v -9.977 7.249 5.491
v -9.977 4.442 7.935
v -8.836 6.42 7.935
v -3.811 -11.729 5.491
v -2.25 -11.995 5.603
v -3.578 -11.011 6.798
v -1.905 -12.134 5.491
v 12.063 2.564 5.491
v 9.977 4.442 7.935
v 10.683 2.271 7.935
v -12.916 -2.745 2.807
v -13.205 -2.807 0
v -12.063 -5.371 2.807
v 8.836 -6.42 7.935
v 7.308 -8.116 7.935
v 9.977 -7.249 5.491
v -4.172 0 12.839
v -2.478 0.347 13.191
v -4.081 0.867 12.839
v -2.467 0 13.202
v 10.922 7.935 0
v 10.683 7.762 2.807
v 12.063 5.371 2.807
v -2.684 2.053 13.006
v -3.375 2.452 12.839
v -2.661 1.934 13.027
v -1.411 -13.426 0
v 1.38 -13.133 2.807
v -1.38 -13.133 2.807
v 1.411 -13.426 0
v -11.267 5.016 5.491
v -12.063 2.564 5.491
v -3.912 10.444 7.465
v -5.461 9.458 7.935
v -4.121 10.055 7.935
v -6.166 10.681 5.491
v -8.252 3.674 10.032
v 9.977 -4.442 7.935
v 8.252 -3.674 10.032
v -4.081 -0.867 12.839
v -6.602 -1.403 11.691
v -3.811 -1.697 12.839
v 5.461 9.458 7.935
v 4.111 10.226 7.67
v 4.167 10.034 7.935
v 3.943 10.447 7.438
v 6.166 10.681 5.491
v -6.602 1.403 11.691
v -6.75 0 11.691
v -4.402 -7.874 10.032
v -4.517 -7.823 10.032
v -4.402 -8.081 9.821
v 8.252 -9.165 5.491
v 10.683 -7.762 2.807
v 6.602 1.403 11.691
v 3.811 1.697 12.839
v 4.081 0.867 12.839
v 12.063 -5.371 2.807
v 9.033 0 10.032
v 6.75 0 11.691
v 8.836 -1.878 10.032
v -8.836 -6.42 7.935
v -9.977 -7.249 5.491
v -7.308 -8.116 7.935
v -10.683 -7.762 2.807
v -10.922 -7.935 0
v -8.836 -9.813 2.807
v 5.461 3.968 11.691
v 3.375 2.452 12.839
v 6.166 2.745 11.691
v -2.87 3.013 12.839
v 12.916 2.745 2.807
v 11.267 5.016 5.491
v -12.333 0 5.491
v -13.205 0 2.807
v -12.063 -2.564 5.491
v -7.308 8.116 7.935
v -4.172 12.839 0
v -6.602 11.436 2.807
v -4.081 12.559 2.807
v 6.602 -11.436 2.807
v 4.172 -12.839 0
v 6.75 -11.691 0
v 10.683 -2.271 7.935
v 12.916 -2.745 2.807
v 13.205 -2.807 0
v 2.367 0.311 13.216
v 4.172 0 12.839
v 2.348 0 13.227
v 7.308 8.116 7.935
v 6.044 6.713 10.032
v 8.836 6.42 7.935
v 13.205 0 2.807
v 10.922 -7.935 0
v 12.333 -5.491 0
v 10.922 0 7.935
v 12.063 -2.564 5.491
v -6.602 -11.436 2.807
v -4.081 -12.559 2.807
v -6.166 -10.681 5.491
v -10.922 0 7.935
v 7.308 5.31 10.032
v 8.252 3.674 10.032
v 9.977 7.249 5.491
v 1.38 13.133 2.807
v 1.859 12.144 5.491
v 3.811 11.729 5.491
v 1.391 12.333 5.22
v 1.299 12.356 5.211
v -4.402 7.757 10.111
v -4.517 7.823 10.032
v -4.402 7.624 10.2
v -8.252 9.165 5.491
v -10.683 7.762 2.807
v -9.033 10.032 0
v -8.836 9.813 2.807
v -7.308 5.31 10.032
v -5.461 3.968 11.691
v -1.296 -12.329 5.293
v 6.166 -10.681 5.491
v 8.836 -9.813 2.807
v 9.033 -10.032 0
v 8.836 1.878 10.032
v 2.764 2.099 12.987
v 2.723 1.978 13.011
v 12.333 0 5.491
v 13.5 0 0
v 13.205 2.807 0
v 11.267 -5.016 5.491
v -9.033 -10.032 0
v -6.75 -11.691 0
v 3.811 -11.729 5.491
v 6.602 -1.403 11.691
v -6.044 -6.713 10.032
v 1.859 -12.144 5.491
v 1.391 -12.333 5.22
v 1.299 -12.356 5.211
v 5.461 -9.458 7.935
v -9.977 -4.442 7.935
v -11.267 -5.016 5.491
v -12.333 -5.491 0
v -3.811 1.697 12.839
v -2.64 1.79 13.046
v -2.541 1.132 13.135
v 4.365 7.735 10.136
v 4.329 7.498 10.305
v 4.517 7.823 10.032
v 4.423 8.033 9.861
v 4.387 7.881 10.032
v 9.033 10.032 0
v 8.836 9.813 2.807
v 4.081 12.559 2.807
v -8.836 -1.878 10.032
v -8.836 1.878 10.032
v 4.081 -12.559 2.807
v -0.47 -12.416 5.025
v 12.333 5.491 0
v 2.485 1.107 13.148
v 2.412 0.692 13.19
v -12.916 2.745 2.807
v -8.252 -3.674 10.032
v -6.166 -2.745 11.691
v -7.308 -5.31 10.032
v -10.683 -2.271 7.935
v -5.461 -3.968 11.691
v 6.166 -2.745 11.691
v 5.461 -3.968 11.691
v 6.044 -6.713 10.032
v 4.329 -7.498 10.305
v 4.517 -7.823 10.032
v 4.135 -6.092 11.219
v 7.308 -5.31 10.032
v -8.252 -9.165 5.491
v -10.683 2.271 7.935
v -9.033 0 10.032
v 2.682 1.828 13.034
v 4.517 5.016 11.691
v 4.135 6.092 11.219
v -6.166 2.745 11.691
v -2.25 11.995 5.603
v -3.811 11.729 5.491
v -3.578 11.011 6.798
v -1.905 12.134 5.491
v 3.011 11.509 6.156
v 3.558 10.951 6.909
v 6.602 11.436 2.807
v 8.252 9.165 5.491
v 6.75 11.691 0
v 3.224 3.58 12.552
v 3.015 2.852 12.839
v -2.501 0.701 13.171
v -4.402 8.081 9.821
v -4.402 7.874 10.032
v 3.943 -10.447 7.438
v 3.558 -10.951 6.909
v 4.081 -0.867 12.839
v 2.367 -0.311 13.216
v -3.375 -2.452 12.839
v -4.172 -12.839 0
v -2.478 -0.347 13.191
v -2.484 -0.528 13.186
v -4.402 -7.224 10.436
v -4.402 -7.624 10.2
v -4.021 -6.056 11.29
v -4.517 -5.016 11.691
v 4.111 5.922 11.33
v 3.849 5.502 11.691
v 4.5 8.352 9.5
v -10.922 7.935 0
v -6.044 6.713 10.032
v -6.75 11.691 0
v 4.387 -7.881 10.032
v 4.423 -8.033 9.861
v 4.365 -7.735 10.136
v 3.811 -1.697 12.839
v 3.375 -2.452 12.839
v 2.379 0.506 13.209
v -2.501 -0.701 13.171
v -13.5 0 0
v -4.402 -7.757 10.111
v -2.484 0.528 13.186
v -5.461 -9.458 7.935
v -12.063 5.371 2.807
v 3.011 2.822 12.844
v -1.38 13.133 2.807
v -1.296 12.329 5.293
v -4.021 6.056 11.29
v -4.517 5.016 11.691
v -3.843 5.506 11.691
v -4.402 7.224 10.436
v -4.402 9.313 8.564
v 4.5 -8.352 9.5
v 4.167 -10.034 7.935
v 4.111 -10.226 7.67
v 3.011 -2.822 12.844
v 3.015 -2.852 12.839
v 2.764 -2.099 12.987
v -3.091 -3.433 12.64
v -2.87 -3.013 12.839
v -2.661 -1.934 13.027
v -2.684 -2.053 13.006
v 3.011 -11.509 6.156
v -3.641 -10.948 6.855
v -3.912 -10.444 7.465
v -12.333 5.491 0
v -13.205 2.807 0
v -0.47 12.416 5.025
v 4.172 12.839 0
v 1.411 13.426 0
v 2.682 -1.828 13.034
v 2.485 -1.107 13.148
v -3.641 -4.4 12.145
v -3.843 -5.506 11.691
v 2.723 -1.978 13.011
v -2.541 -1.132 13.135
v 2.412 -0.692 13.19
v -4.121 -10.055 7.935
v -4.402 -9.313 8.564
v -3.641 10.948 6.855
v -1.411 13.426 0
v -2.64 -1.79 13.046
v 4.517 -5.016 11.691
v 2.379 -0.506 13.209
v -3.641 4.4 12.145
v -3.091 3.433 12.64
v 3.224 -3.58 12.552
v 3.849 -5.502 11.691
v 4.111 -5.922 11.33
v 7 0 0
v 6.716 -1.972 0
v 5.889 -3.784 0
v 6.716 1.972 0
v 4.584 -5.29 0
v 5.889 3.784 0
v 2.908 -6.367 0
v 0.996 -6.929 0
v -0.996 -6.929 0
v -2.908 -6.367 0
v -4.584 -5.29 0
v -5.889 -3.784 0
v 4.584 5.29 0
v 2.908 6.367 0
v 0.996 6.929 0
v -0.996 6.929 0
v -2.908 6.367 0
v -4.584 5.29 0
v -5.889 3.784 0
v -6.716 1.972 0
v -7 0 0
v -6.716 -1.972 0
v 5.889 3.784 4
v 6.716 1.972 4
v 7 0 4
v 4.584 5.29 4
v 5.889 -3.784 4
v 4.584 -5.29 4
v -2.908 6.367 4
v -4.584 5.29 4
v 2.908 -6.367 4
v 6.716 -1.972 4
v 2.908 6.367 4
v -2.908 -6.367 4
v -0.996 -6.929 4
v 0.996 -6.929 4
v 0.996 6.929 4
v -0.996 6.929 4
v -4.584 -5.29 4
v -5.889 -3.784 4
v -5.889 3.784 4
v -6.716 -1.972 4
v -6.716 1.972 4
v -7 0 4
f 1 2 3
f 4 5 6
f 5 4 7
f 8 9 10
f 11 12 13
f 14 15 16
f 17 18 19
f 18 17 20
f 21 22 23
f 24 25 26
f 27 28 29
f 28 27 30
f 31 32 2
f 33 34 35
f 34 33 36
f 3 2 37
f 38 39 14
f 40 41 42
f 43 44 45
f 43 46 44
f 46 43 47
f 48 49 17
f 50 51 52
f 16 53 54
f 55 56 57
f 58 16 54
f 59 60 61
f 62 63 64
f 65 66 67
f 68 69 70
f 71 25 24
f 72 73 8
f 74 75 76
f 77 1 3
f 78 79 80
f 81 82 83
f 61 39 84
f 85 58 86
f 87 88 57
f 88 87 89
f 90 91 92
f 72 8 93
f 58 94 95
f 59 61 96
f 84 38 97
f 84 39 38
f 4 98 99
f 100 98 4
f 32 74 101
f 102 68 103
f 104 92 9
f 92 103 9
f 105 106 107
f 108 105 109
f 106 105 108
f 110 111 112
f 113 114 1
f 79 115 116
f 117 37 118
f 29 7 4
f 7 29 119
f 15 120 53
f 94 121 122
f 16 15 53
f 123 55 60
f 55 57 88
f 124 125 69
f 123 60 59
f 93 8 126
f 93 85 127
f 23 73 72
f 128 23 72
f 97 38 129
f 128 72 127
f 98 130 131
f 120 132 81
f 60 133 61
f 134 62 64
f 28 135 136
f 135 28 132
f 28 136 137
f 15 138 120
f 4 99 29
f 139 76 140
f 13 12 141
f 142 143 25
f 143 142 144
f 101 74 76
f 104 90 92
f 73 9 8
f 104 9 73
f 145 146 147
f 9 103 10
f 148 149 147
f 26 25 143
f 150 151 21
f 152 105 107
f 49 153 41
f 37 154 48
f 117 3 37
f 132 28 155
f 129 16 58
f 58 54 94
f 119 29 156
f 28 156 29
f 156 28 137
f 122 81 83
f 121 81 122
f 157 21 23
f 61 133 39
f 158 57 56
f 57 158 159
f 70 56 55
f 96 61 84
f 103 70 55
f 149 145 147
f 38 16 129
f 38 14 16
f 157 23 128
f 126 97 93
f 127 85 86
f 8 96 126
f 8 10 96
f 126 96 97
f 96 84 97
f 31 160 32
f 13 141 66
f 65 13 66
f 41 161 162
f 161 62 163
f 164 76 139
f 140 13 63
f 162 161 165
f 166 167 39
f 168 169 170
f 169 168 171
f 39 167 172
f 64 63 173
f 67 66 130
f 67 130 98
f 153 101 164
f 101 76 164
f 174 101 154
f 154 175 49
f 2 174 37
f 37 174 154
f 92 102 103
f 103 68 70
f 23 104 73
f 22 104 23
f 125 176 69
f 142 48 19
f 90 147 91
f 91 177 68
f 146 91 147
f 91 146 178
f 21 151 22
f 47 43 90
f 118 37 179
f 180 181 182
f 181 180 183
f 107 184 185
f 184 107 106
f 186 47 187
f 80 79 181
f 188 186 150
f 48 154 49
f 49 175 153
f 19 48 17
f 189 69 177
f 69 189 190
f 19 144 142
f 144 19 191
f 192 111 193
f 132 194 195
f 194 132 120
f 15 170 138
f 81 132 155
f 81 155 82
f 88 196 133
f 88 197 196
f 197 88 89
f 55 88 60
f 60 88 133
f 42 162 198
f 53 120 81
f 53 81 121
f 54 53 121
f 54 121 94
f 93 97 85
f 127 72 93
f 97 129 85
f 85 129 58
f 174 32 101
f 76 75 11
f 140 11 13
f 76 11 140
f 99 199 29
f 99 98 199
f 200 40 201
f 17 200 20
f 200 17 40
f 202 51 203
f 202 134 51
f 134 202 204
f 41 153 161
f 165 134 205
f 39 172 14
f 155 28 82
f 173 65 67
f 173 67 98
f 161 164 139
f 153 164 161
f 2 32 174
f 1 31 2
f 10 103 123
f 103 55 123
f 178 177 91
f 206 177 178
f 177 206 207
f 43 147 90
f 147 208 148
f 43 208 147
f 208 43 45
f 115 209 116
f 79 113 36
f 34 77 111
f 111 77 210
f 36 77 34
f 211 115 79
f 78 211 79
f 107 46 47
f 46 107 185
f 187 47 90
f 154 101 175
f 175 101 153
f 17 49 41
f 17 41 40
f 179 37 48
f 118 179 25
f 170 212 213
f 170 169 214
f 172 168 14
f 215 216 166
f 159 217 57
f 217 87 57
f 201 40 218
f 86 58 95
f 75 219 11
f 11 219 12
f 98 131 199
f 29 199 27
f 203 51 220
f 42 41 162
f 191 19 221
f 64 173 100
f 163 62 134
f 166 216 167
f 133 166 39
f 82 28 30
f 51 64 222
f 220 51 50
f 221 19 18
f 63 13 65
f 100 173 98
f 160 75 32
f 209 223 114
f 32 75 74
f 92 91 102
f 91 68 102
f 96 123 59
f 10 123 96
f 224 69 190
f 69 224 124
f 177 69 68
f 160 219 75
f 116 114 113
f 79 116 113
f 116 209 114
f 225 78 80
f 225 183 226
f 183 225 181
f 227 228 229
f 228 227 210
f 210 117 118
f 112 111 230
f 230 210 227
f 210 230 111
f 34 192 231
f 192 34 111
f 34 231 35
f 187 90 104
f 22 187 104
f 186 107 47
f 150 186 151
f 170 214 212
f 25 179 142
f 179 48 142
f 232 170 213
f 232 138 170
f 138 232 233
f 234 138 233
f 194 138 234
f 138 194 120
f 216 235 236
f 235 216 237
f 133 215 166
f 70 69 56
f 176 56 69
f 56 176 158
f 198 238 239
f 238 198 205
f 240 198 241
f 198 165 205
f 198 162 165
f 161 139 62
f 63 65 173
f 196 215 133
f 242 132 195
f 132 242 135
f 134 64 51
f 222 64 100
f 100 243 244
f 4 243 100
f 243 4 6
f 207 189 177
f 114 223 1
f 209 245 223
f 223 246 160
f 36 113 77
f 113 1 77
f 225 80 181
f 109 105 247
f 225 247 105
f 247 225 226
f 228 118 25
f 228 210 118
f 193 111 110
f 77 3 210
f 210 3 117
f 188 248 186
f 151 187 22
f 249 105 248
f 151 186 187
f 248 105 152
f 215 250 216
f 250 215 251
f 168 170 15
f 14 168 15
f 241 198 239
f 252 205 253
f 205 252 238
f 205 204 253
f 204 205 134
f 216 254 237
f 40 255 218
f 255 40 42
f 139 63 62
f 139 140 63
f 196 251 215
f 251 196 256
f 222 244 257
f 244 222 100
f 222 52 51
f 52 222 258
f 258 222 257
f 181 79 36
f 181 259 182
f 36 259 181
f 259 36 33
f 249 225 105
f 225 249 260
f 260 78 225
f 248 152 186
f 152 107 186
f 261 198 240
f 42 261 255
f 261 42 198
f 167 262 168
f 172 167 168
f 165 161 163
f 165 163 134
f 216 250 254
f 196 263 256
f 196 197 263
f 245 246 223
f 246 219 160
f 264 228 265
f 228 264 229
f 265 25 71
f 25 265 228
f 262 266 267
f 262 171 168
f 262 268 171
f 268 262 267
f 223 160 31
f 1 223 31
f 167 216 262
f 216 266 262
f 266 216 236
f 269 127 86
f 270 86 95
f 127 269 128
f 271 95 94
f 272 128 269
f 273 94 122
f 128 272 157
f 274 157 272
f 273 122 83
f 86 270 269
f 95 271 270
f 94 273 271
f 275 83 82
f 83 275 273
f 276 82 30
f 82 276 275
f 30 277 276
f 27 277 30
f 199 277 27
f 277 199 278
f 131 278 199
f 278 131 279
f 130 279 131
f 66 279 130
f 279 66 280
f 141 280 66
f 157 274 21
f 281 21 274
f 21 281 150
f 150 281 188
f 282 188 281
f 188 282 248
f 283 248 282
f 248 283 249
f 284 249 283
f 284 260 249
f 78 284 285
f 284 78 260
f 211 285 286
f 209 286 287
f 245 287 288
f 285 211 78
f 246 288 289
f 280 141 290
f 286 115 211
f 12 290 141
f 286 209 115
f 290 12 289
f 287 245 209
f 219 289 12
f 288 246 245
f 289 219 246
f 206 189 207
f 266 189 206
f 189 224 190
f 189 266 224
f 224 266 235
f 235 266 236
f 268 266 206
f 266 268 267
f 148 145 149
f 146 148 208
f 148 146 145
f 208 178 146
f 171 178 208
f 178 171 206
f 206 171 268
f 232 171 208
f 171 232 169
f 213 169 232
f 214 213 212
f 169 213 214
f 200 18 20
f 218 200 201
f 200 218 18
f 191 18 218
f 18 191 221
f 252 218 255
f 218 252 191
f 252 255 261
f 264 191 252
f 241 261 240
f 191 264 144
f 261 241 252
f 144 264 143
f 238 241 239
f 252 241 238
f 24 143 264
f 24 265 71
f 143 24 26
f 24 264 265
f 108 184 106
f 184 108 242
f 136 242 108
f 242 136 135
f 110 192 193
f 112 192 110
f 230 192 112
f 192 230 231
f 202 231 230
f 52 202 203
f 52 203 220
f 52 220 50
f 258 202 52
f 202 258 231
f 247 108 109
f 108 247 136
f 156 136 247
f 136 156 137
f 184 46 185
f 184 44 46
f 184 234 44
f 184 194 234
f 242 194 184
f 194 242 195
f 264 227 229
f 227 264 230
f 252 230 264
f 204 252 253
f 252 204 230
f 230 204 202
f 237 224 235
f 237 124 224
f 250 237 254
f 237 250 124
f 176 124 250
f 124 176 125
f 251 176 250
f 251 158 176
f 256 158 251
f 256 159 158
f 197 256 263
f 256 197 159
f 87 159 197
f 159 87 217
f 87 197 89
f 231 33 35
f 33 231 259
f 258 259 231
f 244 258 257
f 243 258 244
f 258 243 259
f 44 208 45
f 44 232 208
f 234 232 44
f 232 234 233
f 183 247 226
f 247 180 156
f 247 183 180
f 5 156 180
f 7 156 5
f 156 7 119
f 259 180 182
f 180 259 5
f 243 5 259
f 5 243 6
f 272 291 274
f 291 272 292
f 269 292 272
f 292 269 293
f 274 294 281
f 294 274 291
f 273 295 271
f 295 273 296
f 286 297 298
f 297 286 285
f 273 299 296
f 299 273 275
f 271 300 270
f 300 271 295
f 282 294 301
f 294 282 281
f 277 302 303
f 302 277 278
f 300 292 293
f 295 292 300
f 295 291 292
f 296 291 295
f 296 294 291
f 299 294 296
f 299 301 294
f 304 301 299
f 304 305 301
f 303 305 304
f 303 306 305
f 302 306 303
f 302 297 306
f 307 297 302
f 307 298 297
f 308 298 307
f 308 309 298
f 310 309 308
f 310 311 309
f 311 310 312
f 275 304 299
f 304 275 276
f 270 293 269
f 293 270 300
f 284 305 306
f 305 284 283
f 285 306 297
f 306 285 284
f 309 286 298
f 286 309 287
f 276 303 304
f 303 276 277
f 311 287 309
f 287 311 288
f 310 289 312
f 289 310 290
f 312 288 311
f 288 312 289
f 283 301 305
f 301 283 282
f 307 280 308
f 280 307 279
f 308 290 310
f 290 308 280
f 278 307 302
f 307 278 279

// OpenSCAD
//Customizable_holder.scad v0.5
//by Benjamen Johnson

// GNU General Public License, version 2
// http://www.gnu.org/licenses/gpl-2.0.html


//default values

// Diameter of the holder in mm
d_sphere=27;

// Diameter of the cylinder cut out in mm 
d_hole=9;

// Height of the hole above the base in mm
h_hole=5; 

// Diameter of the magnet in mm
d_magnet=14;

// Height of the magnet in mm
h_magnet=4;

difference() {
    // create the body
    sphere(d_sphere/2, center=true);
    
    // delete one hemisphere
    translate([0,0,-d_sphere/2])cube(d_sphere,d_sphere,d_sphere/2,center=true);
    
    // remove the cutout
    translate([0,d_sphere/2,d_hole/2+h_hole]) rotate([90,0,0]) cylinder(h=d_sphere,r=d_hole/2);
    
    // make recess for magnet
    cylinder(h=h_magnet, r=d_magnet/2);
    }
